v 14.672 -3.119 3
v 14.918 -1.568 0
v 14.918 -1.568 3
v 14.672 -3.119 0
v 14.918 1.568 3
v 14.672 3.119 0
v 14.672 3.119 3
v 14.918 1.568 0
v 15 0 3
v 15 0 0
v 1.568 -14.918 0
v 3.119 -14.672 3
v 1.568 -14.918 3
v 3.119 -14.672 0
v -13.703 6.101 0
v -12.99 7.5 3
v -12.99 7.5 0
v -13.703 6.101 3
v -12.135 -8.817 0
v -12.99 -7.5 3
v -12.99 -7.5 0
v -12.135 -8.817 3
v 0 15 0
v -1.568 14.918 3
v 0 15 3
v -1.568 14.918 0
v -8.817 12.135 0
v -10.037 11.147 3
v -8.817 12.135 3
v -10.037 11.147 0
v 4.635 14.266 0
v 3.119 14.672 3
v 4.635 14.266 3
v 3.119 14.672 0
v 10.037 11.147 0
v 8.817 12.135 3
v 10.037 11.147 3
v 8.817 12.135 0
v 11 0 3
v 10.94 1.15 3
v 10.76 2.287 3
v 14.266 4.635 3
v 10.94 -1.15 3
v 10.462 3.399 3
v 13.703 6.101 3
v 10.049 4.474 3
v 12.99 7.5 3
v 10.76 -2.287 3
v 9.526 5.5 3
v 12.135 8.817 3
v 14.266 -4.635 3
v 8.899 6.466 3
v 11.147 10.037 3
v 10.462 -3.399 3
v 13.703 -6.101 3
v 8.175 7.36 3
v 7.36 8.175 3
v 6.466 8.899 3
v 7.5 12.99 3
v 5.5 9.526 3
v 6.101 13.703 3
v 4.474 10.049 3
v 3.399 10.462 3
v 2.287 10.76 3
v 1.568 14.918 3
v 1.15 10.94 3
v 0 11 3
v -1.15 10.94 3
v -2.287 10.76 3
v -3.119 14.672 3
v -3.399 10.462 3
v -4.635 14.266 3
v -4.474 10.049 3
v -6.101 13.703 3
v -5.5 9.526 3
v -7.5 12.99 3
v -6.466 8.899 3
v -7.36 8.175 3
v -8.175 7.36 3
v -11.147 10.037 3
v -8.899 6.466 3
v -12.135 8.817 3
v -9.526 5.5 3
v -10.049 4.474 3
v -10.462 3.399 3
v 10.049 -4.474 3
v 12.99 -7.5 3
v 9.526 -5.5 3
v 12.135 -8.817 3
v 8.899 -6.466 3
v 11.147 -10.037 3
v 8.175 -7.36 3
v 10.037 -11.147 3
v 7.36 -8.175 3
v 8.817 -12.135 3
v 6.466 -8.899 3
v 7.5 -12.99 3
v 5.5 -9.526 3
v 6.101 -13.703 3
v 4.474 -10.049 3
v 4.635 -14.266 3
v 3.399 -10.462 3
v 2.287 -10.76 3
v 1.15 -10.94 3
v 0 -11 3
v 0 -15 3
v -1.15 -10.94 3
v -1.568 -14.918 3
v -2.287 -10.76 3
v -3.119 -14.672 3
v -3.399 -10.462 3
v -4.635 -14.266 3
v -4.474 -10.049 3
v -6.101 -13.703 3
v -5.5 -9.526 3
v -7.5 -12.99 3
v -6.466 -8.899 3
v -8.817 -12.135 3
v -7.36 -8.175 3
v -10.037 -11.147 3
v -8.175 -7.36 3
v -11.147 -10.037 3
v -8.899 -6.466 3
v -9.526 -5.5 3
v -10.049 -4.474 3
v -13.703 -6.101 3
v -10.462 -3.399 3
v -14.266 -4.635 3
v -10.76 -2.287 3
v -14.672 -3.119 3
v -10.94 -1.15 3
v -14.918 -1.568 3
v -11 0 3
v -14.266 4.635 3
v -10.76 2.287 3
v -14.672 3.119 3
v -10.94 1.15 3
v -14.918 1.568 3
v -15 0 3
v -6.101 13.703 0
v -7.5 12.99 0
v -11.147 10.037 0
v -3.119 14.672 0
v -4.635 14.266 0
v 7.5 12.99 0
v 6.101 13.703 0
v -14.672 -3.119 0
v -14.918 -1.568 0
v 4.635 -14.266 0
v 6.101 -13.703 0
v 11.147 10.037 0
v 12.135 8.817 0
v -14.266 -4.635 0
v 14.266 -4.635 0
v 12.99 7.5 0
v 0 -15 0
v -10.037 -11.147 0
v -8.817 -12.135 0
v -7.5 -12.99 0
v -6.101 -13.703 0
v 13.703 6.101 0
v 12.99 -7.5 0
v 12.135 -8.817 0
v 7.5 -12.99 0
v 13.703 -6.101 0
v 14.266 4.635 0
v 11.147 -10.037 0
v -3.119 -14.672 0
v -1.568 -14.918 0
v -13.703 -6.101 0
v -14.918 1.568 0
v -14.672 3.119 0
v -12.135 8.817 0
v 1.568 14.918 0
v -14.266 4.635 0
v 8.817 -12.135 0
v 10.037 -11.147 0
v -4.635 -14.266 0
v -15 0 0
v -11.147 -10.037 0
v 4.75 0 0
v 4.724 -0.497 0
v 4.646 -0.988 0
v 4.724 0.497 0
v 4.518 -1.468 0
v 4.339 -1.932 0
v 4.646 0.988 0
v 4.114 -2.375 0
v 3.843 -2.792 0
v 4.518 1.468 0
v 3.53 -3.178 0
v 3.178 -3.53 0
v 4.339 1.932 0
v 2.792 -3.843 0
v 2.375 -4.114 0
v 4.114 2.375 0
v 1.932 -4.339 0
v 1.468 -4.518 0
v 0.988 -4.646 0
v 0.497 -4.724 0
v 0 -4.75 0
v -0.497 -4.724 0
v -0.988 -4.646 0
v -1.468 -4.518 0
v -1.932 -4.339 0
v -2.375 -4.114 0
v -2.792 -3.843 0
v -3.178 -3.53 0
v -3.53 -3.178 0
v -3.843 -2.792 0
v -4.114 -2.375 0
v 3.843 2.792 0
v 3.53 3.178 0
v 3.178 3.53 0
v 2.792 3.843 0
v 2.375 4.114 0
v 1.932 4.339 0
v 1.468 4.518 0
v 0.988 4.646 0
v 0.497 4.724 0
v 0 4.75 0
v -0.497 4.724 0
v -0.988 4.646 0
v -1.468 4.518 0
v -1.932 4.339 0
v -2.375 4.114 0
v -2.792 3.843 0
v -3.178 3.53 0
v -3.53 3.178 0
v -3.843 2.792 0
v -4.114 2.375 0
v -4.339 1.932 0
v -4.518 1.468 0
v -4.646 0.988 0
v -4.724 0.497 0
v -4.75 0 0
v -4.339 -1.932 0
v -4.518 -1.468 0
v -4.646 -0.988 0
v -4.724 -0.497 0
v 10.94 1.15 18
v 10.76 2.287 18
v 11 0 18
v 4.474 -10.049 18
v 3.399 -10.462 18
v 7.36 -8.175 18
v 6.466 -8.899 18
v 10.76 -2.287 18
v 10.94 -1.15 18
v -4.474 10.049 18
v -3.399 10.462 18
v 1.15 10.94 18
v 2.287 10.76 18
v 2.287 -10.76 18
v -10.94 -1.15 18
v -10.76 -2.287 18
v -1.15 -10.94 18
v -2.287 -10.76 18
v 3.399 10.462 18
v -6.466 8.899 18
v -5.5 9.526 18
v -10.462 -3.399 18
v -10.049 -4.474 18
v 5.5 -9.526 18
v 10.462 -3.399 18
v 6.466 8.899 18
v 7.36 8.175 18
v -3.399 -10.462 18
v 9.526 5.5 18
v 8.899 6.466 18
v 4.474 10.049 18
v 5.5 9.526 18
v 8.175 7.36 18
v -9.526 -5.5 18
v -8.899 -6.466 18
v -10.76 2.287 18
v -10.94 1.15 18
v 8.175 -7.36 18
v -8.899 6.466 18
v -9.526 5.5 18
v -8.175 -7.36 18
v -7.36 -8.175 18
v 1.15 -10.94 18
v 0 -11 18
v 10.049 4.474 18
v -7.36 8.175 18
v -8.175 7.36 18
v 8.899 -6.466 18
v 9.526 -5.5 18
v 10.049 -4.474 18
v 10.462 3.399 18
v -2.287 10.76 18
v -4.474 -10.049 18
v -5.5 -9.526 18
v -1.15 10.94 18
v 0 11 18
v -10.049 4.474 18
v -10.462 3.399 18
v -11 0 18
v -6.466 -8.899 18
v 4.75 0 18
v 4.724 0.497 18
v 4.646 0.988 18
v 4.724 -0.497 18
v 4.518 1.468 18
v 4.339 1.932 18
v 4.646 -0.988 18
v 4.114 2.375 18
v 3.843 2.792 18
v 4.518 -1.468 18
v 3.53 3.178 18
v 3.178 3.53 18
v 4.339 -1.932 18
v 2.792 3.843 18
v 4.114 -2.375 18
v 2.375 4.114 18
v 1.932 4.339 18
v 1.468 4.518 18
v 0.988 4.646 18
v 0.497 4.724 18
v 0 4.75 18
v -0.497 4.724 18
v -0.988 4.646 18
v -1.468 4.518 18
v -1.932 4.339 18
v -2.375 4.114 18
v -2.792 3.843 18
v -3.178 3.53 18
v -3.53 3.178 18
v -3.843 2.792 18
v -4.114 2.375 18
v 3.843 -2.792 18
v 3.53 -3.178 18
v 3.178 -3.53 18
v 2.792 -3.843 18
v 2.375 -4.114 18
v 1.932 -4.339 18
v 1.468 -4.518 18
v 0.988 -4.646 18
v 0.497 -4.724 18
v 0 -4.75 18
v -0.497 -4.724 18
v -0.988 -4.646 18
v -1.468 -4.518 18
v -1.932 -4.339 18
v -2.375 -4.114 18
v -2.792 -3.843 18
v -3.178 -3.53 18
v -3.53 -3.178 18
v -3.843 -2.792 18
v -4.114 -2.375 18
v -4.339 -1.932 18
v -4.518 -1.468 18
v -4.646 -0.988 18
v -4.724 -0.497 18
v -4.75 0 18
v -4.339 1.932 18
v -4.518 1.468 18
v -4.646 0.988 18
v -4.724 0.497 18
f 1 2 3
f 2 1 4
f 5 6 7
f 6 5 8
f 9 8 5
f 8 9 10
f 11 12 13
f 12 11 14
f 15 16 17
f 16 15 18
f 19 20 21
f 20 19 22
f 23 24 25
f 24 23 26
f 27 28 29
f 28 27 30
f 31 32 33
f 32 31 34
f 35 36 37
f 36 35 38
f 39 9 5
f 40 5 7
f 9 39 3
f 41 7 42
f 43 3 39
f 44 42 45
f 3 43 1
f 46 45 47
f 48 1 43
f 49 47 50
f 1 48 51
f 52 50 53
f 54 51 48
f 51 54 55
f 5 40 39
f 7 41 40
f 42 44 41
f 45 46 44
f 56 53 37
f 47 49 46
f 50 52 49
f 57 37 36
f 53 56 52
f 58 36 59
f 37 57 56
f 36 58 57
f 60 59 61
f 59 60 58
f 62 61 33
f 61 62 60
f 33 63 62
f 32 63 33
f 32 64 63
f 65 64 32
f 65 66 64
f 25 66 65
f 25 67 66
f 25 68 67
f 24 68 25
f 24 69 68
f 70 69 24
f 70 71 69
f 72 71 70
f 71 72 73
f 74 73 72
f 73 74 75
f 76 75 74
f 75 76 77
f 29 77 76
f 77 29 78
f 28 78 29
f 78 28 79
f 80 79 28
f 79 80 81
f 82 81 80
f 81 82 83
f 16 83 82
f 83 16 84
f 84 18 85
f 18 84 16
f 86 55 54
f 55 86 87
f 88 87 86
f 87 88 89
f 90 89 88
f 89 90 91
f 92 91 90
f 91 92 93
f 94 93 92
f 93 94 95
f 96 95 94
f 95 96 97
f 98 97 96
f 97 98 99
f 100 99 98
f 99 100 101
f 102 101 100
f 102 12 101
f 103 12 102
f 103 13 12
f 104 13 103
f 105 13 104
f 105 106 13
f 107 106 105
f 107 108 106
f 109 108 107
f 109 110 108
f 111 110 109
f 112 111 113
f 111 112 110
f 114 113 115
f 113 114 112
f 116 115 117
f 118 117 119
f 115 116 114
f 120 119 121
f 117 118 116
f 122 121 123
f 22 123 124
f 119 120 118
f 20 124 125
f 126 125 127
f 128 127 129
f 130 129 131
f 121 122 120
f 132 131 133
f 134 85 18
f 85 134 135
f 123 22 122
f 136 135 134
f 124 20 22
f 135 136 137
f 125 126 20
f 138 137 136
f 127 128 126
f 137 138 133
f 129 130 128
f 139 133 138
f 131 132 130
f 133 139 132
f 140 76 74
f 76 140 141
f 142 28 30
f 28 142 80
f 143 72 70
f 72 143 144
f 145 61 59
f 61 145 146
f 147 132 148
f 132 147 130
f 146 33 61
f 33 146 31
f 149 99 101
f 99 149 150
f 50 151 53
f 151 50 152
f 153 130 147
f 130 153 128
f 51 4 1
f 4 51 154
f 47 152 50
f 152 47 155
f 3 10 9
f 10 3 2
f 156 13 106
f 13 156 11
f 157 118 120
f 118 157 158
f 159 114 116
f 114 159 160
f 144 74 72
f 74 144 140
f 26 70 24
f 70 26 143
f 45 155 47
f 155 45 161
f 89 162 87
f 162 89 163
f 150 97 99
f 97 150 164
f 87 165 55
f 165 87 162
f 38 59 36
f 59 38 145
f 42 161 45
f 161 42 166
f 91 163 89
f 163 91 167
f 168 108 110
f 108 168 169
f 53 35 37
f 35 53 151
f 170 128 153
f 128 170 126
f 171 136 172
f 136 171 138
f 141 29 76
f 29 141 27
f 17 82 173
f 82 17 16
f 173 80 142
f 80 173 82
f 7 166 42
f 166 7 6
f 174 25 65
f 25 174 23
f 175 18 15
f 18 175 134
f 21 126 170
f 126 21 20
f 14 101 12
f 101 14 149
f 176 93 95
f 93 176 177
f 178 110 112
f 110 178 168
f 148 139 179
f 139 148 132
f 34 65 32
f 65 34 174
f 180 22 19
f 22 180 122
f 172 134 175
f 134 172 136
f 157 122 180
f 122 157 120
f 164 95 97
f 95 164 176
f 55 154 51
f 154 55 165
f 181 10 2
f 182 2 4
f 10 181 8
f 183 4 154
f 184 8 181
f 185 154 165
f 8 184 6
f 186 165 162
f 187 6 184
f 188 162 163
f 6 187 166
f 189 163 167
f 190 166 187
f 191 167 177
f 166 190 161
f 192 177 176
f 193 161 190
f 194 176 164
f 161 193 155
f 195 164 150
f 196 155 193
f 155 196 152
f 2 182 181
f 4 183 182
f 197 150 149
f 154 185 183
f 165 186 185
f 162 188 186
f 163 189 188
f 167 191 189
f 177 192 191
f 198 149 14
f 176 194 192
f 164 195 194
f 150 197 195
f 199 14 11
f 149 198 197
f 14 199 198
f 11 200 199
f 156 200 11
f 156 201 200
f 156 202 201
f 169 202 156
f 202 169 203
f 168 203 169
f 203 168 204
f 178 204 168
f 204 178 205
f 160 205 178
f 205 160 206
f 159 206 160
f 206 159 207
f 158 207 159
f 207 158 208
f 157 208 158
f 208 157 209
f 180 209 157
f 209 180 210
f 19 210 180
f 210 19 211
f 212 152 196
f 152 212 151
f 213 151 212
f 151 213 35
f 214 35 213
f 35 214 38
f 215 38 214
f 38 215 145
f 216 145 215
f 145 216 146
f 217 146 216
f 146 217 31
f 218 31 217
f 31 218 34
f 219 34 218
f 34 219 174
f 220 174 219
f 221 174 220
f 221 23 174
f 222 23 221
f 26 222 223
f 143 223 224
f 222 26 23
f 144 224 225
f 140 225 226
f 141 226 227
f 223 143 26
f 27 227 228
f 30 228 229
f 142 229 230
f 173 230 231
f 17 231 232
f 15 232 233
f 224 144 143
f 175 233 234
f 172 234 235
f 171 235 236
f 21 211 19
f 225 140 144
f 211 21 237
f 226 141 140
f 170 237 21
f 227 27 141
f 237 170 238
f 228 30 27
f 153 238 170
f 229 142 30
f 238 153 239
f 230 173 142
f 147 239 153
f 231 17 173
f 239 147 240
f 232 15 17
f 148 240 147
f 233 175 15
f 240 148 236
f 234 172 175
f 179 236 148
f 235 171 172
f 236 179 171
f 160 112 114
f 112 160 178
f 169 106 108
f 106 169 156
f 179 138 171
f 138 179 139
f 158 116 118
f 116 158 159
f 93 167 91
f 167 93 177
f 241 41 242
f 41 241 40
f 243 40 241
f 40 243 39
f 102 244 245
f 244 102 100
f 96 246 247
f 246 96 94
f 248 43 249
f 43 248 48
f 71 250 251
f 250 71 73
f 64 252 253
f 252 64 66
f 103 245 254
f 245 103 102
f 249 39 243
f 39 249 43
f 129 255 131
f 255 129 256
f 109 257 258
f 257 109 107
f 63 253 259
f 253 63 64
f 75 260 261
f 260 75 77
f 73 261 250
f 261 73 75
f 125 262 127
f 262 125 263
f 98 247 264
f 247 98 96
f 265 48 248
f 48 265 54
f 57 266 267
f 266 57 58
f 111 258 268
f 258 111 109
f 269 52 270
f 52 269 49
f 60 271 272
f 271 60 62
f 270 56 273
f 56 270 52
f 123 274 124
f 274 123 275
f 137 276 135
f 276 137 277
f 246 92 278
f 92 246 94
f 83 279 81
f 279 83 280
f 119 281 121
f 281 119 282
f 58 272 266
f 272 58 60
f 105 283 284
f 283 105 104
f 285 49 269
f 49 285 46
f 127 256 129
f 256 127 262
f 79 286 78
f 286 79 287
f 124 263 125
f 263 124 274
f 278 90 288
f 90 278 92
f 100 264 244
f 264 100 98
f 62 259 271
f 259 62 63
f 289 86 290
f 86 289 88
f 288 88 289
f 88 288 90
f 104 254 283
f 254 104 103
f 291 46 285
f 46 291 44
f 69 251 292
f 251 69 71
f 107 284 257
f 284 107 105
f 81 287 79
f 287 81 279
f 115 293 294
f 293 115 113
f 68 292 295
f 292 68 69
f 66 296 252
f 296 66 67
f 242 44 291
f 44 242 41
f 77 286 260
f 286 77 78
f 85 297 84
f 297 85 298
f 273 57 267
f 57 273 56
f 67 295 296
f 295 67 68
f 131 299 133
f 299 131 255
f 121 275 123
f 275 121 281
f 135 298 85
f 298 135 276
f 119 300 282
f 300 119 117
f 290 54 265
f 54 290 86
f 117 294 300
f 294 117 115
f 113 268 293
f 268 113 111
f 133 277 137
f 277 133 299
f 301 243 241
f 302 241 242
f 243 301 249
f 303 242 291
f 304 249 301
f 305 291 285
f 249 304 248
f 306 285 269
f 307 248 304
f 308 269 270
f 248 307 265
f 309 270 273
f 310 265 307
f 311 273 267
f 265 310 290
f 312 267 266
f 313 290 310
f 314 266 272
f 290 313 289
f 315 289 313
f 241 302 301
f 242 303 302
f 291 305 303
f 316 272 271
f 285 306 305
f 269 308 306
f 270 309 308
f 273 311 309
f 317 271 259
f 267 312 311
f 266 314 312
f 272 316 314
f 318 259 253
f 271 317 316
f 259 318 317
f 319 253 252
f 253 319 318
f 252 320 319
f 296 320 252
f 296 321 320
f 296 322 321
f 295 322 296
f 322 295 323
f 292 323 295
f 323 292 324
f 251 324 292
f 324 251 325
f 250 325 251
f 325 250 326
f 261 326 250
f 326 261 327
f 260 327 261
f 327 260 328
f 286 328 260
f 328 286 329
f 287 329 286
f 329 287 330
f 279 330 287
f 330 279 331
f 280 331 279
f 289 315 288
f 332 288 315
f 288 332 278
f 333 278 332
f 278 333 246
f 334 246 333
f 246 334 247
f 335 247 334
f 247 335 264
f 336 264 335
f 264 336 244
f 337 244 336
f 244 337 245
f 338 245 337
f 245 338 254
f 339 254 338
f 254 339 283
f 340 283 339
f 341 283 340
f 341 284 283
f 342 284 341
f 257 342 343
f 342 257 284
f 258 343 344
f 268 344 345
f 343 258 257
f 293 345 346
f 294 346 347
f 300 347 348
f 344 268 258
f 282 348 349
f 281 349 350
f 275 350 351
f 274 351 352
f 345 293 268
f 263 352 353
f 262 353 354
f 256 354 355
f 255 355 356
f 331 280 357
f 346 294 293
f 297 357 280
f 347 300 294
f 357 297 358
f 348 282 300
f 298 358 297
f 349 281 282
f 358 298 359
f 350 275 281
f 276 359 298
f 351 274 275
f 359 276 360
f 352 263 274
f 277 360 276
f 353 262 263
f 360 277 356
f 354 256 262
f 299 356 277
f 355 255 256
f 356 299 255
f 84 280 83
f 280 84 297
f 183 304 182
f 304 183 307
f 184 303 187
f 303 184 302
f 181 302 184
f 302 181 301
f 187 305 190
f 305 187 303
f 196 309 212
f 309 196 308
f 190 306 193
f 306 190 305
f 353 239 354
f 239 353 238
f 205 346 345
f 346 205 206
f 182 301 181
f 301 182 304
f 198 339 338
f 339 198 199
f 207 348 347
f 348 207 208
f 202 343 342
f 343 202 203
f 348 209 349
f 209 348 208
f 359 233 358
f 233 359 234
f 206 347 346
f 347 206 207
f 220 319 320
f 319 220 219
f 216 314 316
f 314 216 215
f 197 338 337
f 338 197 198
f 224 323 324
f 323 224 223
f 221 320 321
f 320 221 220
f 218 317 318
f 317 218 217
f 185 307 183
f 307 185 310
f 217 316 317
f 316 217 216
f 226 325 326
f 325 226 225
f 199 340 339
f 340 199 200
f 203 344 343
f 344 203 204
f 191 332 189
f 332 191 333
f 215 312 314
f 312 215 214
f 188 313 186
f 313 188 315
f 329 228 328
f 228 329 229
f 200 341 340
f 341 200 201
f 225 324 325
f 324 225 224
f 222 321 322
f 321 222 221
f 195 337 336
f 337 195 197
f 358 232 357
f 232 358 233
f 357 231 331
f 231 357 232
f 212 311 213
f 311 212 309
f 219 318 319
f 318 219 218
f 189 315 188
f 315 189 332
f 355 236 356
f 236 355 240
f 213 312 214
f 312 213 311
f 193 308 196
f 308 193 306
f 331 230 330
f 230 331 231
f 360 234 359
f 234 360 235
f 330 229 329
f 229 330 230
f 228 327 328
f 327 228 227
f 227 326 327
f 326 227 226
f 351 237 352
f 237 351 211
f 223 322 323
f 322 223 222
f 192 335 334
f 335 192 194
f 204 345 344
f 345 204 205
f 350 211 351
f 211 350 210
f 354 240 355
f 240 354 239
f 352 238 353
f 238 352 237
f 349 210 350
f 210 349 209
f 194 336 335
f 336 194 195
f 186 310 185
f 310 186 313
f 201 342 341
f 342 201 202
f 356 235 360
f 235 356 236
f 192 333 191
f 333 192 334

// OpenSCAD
// Cable gland body for 9 mm cable.
$fn = 60;
eps = 0.02;
cable_d = 9;
body_d = 22;
body_l = 18;
flange_d = body_d + 8;
flange_t = 3;
difference() {
    union() { cylinder(d = flange_d, h = flange_t); cylinder(d = body_d, h = body_l); }
    translate([0, 0, -eps]) cylinder(d = cable_d + 0.5, h = body_l + 2 * eps);
}
